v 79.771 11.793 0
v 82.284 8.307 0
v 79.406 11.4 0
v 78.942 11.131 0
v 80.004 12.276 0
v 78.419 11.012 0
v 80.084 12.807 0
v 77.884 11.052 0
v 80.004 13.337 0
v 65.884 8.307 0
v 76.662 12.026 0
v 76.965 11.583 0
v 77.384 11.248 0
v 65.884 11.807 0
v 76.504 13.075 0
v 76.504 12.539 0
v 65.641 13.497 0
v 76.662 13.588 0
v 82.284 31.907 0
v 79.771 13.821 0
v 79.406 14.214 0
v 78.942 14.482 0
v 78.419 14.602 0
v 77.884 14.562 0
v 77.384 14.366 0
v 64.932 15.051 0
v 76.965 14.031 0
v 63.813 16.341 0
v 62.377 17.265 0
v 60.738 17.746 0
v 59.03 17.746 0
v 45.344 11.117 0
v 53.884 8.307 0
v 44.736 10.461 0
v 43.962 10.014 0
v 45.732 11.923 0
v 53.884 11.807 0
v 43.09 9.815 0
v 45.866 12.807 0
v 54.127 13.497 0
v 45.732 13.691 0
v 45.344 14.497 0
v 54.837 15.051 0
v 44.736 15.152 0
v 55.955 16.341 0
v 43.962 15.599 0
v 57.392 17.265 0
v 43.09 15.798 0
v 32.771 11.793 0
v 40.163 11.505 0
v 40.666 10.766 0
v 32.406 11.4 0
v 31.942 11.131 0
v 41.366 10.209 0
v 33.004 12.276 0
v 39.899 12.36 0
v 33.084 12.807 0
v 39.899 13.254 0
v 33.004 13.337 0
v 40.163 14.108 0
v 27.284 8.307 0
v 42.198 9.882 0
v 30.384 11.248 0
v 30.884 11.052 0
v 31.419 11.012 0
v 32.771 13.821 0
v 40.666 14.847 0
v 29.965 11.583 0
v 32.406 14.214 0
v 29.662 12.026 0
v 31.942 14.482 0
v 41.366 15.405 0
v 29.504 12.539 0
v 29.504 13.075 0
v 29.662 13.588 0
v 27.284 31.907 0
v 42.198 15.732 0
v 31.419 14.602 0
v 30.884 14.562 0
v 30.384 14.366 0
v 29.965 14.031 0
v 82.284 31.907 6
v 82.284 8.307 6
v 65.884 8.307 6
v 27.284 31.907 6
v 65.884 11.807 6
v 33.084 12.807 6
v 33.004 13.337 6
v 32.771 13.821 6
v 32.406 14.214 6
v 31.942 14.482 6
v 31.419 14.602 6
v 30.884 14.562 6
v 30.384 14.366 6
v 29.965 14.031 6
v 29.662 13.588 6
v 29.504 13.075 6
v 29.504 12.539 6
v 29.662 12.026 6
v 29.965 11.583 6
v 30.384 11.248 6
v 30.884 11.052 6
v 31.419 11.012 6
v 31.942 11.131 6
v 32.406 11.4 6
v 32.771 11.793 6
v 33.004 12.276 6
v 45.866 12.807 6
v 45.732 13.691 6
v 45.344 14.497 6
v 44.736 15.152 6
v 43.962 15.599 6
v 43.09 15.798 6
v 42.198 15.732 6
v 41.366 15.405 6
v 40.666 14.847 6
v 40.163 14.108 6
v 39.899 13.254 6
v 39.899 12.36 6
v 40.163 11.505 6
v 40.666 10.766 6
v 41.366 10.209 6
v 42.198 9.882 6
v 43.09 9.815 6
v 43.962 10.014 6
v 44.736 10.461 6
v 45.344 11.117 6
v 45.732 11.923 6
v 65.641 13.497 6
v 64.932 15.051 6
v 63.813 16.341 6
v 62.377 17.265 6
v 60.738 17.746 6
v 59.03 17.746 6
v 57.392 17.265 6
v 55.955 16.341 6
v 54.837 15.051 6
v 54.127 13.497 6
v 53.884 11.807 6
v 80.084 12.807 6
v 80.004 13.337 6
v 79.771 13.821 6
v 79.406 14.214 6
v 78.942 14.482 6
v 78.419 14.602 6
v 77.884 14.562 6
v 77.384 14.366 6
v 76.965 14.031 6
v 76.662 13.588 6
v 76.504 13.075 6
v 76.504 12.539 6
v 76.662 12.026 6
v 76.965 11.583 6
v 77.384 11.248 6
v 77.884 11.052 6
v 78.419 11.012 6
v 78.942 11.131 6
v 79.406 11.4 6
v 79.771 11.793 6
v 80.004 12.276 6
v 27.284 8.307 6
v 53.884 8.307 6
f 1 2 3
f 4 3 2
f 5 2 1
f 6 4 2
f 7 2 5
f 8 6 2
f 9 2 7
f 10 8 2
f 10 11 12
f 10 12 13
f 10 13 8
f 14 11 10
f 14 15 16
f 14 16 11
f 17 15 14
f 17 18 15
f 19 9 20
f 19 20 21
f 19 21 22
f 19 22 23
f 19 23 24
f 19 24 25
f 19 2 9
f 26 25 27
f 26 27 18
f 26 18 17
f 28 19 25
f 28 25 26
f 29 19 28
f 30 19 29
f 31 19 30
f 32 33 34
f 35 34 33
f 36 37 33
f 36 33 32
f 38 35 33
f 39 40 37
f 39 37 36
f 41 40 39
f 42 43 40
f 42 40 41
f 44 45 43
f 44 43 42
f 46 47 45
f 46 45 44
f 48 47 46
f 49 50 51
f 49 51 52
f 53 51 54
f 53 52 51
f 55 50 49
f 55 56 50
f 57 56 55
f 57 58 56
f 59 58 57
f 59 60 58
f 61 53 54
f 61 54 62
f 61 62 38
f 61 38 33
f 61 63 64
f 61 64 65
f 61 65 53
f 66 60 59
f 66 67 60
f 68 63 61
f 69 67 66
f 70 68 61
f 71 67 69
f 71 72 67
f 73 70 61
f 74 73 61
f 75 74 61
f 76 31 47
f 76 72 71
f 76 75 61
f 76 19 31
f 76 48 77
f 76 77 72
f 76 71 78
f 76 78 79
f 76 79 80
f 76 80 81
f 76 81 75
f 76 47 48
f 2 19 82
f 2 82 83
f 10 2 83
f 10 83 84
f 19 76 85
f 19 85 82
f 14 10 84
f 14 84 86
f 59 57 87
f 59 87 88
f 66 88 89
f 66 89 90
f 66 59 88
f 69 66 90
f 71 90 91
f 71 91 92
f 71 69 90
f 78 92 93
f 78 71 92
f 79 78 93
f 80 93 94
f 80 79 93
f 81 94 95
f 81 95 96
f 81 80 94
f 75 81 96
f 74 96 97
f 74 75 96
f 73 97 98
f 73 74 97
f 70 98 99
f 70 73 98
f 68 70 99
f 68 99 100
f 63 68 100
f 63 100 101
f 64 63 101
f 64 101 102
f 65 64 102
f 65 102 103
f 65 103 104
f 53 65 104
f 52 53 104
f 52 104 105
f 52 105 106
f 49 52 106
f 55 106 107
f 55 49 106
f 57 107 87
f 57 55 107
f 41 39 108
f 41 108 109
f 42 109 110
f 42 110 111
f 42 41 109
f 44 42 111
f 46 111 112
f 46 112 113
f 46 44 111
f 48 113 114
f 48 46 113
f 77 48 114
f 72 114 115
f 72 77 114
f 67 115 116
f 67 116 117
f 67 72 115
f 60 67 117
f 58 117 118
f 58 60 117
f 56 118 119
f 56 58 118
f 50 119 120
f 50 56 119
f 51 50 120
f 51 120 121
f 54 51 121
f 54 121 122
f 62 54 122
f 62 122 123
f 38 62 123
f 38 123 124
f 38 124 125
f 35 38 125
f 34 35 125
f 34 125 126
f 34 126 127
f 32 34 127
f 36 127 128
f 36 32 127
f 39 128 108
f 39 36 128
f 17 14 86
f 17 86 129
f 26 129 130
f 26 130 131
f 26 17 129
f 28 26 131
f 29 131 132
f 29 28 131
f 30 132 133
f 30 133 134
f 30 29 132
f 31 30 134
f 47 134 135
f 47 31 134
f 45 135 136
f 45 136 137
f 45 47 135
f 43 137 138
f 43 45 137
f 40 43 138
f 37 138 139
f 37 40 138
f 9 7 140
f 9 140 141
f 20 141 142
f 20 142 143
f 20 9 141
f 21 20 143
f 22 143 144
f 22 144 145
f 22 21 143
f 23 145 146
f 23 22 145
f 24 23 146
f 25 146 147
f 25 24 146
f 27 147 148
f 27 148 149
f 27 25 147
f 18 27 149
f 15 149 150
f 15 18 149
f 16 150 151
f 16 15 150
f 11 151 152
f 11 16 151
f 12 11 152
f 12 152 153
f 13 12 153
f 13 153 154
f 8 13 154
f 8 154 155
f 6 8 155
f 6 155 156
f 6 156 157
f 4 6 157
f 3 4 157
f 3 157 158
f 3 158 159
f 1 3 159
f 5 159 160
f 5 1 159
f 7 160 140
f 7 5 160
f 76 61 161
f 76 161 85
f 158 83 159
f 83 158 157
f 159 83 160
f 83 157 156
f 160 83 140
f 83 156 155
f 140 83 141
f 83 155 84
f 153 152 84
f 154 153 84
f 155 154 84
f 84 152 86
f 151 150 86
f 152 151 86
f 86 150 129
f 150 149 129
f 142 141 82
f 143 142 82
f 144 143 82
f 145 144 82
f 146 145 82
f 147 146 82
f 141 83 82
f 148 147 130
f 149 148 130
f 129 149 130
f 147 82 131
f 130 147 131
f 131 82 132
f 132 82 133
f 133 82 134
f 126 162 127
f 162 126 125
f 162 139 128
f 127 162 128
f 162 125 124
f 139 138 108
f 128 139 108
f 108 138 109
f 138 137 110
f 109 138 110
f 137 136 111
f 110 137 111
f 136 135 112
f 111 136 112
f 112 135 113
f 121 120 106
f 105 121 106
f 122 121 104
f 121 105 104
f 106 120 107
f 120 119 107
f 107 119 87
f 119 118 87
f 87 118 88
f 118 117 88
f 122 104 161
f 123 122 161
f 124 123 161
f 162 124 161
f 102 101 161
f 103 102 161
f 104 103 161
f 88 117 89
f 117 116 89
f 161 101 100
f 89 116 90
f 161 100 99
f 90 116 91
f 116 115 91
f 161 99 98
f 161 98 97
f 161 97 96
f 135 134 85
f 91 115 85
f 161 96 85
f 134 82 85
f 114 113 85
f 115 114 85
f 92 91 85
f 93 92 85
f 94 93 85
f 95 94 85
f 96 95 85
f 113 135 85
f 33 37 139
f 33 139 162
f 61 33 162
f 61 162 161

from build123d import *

# Parameters (mm, degrees)
MODEL_R                  = 1.8
MODEL_R_2                = 3
RESSALTO_EXTRUS_O1_DEPTH = 6


with BuildPart() as part:
    # Model → Ressalto-extrusão1 (new body)
    with BuildSketch(Plane.XY):
        with BuildLine():
            Line((27.28416807, 8.306820103), (27.28416807, 31.906820103))
            Line((27.28416807, 31.906820103), (82.28416807, 31.906820103))
            Line((82.28416807, 31.906820103), (82.28416807, 8.306820103))
            Line((82.28416807, 8.306820103), (65.88416807, 8.306820103))
            Line((65.88416807, 8.306820103), (65.88416807, 11.806820103))
            ThreePointArc((65.88416807, 11.806820103), (59.88416807, 17.806820103), (53.88416807, 11.806820103))
            Line((53.88416807, 11.806820103), (53.88416807, 8.306820103))
            Line((53.88416807, 8.306820103), (27.28416807, 8.306820103))
        make_face()
        with Locations((78.28416807, 12.806820103)):
            Circle(MODEL_R, mode=Mode.SUBTRACT)
        with Locations((42.86558438, 12.806820103)):
            Circle(MODEL_R_2, mode=Mode.SUBTRACT)
        with Locations((31.28416807, 12.806820103)):
            Circle(MODEL_R, mode=Mode.SUBTRACT)
    extrude(amount=RESSALTO_EXTRUS_O1_DEPTH)


solid = part.part
